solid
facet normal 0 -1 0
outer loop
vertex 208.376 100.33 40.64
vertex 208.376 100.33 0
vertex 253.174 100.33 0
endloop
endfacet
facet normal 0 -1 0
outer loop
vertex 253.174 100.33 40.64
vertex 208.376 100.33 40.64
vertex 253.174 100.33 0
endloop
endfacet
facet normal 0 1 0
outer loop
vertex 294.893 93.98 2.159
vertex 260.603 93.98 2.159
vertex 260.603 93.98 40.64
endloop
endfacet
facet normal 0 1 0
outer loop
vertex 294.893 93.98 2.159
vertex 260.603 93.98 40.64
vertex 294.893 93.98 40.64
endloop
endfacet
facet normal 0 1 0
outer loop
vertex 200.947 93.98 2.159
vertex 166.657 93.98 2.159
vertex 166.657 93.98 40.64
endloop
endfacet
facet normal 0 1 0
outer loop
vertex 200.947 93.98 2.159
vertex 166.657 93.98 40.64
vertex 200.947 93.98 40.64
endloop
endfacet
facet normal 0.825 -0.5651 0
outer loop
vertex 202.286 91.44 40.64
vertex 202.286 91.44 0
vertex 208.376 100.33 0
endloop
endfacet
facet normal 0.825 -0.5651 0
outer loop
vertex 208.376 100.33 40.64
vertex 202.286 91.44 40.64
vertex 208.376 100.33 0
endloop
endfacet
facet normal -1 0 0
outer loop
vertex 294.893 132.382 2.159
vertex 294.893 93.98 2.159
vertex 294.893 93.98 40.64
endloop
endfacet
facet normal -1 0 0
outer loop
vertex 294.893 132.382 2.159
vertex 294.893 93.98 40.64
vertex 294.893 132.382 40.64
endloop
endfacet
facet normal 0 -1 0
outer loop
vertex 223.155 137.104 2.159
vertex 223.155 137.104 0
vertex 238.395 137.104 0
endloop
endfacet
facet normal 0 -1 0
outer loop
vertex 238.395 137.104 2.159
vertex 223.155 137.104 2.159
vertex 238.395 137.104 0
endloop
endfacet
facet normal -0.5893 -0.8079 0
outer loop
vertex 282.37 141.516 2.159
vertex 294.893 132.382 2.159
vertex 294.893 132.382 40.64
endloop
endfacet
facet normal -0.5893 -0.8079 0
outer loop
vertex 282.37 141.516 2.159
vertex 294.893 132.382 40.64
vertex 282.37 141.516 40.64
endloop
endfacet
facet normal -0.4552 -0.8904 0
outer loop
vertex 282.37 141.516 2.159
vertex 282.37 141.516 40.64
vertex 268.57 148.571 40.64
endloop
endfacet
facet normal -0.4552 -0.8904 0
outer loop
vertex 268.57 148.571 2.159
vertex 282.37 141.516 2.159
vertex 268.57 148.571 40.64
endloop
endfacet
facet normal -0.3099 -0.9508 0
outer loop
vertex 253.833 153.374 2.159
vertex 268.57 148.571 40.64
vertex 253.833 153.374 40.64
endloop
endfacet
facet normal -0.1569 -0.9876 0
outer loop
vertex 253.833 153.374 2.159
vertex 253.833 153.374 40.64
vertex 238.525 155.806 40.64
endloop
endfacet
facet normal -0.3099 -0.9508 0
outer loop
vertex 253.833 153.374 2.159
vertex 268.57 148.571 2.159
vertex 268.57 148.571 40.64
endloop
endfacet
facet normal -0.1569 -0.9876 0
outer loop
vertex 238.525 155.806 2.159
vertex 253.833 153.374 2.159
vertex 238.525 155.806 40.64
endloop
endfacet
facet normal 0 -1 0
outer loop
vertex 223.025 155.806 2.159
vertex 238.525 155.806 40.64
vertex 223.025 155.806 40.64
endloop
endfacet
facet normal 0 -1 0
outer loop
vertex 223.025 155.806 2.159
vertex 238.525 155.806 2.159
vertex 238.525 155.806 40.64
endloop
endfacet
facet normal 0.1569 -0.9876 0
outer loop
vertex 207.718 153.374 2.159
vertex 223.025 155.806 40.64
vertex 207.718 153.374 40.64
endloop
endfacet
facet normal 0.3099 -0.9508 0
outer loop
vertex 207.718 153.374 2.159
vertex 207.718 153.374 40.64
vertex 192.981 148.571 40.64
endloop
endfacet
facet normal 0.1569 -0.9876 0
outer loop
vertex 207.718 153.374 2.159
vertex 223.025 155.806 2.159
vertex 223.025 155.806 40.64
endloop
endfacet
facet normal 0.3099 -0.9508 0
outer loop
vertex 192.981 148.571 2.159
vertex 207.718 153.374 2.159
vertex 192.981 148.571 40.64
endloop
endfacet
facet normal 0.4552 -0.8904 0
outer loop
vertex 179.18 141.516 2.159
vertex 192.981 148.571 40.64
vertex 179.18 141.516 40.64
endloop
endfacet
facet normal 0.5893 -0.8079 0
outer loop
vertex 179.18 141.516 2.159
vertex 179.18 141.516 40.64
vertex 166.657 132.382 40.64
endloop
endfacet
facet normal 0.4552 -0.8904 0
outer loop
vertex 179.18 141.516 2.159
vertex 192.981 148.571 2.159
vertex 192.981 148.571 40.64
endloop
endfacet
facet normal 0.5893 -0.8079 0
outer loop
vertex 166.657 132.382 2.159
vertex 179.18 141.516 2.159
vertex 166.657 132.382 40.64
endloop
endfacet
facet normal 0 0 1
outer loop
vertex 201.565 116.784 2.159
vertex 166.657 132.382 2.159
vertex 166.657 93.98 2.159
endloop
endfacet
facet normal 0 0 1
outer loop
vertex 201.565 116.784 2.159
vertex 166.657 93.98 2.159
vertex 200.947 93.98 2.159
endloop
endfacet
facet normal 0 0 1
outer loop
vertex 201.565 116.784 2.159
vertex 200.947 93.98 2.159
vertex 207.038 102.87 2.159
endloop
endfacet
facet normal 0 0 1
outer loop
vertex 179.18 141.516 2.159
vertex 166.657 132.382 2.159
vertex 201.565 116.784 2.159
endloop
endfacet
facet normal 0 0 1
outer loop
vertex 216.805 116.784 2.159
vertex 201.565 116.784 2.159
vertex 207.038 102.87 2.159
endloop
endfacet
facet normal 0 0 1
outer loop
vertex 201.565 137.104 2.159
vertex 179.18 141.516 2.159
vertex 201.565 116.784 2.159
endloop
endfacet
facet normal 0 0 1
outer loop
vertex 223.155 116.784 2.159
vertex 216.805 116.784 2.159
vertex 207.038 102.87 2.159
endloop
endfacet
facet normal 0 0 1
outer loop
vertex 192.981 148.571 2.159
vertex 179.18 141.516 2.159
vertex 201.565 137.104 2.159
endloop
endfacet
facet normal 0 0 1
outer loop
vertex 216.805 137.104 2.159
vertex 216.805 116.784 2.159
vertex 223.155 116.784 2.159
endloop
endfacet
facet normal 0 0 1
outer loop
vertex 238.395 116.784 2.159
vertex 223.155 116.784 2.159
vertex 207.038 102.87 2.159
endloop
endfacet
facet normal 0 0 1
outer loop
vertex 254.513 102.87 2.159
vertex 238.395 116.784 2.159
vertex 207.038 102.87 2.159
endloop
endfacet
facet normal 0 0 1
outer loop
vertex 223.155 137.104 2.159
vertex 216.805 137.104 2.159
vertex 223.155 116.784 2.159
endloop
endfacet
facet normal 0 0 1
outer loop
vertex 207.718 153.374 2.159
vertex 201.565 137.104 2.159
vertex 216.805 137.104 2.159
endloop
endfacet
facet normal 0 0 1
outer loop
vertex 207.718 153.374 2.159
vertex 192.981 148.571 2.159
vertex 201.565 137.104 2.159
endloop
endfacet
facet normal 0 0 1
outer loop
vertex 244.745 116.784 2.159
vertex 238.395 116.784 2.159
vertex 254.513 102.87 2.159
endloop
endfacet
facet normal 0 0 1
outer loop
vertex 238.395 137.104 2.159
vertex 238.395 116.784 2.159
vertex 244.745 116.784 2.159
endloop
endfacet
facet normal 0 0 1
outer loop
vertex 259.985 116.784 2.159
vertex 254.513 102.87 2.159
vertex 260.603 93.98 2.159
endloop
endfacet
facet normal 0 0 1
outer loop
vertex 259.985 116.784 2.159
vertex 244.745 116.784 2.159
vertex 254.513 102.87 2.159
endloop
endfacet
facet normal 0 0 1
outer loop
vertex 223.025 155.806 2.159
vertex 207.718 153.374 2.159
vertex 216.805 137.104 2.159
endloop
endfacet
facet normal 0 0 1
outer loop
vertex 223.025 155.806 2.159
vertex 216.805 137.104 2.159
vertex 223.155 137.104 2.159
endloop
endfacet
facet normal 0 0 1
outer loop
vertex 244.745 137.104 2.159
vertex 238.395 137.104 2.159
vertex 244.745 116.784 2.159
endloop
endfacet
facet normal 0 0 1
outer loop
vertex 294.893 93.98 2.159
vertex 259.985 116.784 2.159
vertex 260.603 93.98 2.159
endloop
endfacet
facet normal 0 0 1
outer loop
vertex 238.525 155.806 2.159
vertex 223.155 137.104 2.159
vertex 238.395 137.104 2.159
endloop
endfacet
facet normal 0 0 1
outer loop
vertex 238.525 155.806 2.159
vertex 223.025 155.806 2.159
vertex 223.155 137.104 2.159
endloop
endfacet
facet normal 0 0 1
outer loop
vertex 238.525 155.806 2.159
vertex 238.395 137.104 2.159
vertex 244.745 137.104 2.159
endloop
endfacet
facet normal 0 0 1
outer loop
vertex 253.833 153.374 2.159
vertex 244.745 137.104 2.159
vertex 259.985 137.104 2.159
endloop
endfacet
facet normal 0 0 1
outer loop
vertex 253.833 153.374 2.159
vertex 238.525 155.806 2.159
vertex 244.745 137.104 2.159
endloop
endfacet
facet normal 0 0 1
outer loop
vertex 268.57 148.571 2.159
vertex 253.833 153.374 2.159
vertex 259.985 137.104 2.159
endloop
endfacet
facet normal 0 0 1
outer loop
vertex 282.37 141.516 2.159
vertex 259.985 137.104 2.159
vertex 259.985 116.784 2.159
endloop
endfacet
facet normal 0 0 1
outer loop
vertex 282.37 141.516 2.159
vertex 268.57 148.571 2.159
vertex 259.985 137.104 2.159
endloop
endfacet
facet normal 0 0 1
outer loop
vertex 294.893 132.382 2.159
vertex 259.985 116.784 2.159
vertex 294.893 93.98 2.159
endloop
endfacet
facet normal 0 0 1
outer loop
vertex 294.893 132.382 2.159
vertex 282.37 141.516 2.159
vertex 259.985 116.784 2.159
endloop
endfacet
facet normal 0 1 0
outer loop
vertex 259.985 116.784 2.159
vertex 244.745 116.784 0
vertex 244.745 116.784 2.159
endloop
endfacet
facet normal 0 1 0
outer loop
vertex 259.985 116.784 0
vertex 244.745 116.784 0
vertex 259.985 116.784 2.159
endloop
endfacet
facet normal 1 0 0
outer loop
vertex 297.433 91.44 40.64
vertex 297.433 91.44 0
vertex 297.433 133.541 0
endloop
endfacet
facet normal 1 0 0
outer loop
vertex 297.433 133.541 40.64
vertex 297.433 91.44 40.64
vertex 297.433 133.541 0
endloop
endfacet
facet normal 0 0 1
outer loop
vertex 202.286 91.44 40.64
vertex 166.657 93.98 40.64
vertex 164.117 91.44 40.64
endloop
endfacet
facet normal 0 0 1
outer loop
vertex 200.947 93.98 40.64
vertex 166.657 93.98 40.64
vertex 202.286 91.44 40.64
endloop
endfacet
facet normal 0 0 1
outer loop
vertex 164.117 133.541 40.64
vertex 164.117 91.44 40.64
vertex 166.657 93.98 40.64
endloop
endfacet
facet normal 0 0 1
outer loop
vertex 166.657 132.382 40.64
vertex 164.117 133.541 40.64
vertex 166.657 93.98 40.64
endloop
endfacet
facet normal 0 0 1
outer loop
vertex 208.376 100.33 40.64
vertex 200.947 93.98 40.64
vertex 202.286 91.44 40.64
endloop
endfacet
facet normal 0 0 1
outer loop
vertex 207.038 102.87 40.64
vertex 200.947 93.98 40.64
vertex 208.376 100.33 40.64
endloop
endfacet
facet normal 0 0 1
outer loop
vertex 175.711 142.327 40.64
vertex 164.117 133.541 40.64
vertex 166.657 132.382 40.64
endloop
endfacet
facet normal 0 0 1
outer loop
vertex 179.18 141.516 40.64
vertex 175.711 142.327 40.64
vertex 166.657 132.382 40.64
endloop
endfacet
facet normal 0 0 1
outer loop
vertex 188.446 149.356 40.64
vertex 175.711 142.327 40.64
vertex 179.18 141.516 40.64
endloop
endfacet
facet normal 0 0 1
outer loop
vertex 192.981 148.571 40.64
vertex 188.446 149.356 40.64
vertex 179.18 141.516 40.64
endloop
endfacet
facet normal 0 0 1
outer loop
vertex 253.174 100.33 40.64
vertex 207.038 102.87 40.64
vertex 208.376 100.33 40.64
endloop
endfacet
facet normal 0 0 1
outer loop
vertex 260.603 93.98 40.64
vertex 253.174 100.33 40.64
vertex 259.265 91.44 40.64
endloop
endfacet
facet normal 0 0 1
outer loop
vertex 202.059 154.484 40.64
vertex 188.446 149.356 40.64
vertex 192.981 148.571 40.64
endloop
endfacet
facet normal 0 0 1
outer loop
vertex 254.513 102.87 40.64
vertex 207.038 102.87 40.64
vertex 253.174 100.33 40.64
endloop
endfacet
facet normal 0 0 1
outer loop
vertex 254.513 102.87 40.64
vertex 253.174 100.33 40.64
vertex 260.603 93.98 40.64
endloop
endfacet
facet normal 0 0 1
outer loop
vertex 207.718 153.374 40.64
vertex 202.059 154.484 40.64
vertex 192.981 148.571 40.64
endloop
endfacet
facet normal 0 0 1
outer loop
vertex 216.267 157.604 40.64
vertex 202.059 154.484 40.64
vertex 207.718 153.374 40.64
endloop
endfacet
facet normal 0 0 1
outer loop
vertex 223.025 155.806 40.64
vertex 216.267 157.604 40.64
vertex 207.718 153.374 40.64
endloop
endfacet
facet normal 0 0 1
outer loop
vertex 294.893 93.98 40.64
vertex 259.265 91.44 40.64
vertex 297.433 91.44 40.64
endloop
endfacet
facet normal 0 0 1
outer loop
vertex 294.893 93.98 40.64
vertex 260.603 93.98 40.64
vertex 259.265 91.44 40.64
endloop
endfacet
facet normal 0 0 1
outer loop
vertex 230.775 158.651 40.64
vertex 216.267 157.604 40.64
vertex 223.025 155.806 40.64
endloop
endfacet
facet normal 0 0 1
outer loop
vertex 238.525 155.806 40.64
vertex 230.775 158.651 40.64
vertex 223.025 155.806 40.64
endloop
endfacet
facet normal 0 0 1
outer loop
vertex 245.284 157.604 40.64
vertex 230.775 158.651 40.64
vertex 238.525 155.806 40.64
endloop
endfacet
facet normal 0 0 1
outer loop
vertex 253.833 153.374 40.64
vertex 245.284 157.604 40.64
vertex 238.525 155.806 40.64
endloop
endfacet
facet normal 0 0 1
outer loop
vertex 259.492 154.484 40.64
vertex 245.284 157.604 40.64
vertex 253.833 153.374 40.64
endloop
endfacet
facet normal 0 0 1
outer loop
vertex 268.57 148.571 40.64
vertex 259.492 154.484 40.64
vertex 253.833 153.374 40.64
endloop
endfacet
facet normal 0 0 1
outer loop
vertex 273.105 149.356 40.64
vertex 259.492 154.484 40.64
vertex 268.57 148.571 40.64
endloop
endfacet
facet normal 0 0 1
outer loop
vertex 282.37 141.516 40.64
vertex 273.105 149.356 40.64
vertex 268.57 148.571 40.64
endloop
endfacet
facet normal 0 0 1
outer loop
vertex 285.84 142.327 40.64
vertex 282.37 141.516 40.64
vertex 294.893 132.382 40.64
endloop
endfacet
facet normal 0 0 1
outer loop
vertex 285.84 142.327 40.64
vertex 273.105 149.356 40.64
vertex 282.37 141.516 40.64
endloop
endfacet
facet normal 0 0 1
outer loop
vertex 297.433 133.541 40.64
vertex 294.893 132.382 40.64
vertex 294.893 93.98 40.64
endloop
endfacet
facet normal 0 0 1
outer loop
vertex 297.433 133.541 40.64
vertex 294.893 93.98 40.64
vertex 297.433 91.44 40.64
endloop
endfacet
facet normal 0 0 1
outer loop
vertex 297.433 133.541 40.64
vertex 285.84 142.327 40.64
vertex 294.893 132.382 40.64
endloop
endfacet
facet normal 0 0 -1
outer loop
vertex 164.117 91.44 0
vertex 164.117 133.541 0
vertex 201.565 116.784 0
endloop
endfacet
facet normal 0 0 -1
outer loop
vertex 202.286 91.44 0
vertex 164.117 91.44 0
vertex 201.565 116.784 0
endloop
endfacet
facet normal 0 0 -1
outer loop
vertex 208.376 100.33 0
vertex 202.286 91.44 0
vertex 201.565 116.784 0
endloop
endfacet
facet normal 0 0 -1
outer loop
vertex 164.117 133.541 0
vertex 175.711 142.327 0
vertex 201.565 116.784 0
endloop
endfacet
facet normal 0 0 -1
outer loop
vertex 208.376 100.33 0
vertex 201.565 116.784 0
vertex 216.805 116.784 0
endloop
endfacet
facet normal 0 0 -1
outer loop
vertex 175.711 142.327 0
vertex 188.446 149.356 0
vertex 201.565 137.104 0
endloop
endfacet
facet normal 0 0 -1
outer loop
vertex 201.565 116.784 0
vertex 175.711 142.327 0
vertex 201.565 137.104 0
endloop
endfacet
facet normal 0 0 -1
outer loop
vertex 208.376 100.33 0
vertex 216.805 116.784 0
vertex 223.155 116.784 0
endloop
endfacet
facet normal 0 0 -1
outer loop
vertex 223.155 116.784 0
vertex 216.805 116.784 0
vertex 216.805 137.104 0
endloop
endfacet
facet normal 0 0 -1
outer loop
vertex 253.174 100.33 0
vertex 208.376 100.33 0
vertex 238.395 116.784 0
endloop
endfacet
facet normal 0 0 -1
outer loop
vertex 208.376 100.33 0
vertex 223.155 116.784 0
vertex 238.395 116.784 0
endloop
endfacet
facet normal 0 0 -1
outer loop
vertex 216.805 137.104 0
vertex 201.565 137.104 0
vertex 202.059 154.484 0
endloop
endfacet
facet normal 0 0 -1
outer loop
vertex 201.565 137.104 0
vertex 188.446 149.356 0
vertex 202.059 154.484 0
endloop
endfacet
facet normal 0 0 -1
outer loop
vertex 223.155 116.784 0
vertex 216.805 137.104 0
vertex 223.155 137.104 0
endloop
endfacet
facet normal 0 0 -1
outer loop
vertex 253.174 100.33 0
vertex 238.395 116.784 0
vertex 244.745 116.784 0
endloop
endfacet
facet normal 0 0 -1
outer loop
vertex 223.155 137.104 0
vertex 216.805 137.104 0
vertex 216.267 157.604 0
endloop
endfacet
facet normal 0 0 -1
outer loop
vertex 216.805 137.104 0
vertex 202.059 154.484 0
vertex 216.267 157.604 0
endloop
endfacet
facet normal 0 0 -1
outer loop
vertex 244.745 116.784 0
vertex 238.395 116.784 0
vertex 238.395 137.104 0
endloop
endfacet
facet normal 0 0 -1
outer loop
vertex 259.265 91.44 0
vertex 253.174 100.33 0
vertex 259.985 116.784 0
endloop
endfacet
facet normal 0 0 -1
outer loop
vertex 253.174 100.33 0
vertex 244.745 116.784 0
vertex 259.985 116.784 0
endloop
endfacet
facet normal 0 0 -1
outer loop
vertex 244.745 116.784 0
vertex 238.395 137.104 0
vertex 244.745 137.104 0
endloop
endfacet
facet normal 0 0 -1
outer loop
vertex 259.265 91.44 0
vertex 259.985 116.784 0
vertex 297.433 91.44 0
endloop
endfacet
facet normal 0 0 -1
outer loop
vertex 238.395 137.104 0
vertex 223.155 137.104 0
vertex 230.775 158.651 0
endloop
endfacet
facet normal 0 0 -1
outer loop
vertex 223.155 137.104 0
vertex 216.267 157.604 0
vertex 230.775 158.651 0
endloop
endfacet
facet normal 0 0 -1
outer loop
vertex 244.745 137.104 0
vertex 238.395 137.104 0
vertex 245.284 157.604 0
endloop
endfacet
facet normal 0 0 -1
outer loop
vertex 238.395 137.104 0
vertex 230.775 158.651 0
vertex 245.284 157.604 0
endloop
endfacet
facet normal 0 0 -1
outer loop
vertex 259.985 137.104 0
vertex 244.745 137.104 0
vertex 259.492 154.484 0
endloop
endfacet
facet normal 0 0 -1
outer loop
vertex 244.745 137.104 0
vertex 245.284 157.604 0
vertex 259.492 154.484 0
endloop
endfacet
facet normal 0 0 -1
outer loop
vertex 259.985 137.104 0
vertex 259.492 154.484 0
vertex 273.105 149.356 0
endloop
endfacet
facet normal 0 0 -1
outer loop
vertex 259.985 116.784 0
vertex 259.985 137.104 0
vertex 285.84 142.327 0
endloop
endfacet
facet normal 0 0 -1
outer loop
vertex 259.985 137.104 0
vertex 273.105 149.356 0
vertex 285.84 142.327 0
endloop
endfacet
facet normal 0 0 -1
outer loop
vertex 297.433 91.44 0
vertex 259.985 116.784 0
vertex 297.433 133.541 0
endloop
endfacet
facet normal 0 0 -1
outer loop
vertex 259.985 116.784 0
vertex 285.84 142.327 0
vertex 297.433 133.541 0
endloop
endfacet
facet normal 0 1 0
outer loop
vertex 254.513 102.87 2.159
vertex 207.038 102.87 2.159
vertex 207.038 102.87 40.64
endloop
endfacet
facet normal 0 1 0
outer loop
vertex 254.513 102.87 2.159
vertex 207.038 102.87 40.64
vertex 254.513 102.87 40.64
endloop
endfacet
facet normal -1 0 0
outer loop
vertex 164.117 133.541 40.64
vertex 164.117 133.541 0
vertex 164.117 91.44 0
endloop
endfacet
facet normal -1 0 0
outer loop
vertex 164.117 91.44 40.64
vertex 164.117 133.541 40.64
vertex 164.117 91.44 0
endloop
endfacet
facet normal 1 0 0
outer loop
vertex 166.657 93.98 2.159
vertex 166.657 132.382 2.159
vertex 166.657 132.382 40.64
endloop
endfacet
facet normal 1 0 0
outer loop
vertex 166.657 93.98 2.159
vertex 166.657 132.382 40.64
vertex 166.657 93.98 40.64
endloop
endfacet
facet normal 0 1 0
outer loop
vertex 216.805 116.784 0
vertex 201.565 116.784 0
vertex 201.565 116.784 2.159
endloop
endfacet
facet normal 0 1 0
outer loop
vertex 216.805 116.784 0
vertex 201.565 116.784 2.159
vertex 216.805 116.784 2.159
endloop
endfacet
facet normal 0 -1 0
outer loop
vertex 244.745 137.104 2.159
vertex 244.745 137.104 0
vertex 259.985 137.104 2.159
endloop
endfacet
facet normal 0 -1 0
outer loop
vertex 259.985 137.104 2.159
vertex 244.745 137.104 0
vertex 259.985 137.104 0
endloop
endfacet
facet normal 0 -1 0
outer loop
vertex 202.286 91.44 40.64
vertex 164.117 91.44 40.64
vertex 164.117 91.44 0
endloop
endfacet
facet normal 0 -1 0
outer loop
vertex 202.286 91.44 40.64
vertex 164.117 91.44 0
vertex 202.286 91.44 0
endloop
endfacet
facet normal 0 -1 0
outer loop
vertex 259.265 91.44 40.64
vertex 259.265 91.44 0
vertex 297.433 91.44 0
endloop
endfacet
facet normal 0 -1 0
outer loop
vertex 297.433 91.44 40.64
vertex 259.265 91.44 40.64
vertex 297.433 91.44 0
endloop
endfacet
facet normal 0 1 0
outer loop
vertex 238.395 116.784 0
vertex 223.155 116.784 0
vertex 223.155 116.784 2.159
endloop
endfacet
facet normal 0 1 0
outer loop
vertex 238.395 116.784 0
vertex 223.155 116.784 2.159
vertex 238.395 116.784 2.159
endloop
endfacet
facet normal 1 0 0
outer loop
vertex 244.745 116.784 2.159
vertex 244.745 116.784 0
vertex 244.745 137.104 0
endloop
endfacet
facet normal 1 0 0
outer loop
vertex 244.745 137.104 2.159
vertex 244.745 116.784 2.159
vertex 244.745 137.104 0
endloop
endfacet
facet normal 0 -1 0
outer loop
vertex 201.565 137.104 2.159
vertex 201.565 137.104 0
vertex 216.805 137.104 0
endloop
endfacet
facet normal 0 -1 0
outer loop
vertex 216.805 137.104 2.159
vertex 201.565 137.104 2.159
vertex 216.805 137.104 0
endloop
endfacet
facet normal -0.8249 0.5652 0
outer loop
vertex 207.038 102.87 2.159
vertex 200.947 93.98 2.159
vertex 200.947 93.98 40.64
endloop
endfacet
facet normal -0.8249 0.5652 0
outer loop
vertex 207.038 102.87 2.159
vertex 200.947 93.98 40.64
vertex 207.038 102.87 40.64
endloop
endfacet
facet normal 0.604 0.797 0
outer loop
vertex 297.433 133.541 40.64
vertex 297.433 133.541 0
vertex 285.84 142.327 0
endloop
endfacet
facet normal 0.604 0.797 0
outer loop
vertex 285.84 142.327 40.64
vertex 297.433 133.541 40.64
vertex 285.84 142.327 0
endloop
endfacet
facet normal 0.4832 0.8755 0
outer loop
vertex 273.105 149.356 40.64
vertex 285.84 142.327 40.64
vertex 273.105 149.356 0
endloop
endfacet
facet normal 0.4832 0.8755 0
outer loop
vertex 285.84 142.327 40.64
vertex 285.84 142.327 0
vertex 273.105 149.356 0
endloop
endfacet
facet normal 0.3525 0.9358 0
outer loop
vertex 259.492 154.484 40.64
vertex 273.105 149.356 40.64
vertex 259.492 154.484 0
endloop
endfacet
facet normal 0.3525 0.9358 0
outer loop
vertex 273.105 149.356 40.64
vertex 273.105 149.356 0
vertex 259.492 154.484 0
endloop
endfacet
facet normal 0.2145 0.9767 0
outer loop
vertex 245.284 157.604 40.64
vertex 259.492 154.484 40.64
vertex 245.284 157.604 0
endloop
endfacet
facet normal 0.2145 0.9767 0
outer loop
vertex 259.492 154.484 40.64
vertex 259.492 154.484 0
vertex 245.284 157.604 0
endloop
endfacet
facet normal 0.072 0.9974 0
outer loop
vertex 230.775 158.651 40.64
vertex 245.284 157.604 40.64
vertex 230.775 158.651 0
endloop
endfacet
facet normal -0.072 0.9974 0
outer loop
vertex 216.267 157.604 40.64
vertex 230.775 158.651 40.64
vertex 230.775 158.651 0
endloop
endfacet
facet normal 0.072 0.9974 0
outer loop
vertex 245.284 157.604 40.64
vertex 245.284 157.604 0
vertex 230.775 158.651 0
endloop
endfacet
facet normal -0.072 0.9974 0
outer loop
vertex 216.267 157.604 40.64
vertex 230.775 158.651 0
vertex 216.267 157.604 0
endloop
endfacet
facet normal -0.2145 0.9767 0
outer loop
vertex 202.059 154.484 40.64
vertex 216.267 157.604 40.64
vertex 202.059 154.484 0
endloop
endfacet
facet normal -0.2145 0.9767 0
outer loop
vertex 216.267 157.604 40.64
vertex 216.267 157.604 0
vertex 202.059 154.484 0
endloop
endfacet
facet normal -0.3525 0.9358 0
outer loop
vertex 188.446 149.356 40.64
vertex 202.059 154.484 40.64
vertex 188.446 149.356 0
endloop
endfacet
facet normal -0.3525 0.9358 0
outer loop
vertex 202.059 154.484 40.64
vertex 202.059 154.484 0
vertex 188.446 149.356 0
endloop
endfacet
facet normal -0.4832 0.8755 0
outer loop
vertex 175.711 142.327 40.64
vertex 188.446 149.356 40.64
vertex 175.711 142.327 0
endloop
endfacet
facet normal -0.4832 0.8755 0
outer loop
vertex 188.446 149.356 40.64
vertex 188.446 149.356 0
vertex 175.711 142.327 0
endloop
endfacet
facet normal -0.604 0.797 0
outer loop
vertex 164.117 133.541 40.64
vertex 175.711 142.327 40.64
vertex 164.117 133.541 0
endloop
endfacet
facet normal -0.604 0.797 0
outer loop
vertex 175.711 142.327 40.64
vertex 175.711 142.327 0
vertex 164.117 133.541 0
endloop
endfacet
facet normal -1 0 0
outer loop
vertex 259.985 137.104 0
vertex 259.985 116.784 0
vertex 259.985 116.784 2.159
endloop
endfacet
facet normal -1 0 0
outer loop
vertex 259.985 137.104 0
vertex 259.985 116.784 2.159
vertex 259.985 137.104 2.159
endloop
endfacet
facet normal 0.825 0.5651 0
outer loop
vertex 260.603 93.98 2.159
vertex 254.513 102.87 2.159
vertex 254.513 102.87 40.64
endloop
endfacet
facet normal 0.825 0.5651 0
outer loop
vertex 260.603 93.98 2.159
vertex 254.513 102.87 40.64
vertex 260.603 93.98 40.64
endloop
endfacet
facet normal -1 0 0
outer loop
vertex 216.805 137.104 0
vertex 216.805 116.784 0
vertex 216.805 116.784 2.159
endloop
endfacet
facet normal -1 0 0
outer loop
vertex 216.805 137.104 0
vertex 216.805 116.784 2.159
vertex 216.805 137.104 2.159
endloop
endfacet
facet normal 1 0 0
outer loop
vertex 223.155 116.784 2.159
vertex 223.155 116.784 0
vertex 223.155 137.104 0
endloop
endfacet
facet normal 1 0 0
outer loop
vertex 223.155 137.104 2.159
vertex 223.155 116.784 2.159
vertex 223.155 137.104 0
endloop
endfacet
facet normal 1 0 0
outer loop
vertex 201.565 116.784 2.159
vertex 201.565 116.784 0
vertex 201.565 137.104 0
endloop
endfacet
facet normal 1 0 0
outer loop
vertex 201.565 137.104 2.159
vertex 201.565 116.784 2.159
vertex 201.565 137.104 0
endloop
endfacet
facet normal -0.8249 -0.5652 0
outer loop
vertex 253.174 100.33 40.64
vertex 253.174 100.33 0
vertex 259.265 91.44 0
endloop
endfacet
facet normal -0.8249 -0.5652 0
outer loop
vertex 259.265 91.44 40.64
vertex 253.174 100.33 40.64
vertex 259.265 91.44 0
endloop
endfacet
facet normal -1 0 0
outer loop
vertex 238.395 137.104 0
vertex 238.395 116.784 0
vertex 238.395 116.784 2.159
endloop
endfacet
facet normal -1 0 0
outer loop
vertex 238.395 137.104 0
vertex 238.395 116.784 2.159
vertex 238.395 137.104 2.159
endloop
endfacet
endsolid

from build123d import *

# Parameters (mm, degrees)
SKETCH2_W           = 15.24
SKETCH2_H           = 20.32
BOSS_EXTRUDE4_DEPTH = 2.159
EXTRUDE_THIN2_DEPTH = 40.64


with BuildPart() as part:
    # Sketch2 → Boss-Extrude4 (new body)
    with BuildSketch(Plane.XY):
        with BuildLine():
            Line((166.65702, 132.382444359), (166.65702, 93.98))
            Line((166.65702, 93.98), (200.94702, 93.98))
            Line((200.94702, 93.98), (207.037726035, 102.87))
            Line((207.037726035, 102.87), (254.512766428, 102.87))
            Line((254.512766428, 102.87), (260.603472462, 93.98))
            Line((260.603472462, 93.98), (294.893472462, 93.98))
            Line((294.893472462, 93.98), (294.893472462, 132.382444359))
            ThreePointArc((294.893472462, 132.382444359), (230.775246231, 156.110938615), (166.65702, 132.382444359))
        make_face()
        with Locations((252.365246231, 126.944020361)):
            Rectangle(SKETCH2_W, SKETCH2_H, mode=Mode.SUBTRACT)
        with Locations((209.185246231, 126.944020361)):
            Rectangle(SKETCH2_W, SKETCH2_H, mode=Mode.SUBTRACT)
        with Locations((230.775246231, 126.944020361)):
            Rectangle(SKETCH2_W, SKETCH2_H, mode=Mode.SUBTRACT)
    extrude(amount=BOSS_EXTRUDE4_DEPTH)

    # Sketch2<7> → Extrude-Thin2 (add)
    with BuildSketch(Plane.XY):
        with BuildLine():
            Line((164.11702, 133.541292), (164.11702, 91.44))
            Line((164.11702, 91.44), (202.285763232, 91.44))
            Line((202.285763232, 91.44), (208.376469266, 100.33))
            Line((208.376469266, 100.33), (253.174023196, 100.33))
            Line((253.174023196, 100.33), (259.264729231, 91.44))
            Line((259.264729231, 91.44), (297.433472462, 91.44))
            Line((297.433472462, 91.44), (297.433472462, 133.541292))
            ThreePointArc((297.433472462, 133.541292), (230.775246231, 158.650938615), (164.11702, 133.541292))
        make_face()
        with BuildLine():
            Line((166.65702, 132.382444359), (166.65702, 93.98))
            Line((166.65702, 93.98), (200.94702, 93.98))
            Line((200.94702, 93.98), (207.037726035, 102.87))
            Line((207.037726035, 102.87), (254.512766428, 102.87))
            Line((254.512766428, 102.87), (260.603472462, 93.98))
            Line((260.603472462, 93.98), (294.893472462, 93.98))
            Line((294.893472462, 93.98), (294.893472462, 132.382444359))
            ThreePointArc((294.893472462, 132.382444359), (230.775246231, 156.110938615), (166.65702, 132.382444359))
        make_face(mode=Mode.SUBTRACT)
    extrude(amount=EXTRUDE_THIN2_DEPTH)


solid = part.part
